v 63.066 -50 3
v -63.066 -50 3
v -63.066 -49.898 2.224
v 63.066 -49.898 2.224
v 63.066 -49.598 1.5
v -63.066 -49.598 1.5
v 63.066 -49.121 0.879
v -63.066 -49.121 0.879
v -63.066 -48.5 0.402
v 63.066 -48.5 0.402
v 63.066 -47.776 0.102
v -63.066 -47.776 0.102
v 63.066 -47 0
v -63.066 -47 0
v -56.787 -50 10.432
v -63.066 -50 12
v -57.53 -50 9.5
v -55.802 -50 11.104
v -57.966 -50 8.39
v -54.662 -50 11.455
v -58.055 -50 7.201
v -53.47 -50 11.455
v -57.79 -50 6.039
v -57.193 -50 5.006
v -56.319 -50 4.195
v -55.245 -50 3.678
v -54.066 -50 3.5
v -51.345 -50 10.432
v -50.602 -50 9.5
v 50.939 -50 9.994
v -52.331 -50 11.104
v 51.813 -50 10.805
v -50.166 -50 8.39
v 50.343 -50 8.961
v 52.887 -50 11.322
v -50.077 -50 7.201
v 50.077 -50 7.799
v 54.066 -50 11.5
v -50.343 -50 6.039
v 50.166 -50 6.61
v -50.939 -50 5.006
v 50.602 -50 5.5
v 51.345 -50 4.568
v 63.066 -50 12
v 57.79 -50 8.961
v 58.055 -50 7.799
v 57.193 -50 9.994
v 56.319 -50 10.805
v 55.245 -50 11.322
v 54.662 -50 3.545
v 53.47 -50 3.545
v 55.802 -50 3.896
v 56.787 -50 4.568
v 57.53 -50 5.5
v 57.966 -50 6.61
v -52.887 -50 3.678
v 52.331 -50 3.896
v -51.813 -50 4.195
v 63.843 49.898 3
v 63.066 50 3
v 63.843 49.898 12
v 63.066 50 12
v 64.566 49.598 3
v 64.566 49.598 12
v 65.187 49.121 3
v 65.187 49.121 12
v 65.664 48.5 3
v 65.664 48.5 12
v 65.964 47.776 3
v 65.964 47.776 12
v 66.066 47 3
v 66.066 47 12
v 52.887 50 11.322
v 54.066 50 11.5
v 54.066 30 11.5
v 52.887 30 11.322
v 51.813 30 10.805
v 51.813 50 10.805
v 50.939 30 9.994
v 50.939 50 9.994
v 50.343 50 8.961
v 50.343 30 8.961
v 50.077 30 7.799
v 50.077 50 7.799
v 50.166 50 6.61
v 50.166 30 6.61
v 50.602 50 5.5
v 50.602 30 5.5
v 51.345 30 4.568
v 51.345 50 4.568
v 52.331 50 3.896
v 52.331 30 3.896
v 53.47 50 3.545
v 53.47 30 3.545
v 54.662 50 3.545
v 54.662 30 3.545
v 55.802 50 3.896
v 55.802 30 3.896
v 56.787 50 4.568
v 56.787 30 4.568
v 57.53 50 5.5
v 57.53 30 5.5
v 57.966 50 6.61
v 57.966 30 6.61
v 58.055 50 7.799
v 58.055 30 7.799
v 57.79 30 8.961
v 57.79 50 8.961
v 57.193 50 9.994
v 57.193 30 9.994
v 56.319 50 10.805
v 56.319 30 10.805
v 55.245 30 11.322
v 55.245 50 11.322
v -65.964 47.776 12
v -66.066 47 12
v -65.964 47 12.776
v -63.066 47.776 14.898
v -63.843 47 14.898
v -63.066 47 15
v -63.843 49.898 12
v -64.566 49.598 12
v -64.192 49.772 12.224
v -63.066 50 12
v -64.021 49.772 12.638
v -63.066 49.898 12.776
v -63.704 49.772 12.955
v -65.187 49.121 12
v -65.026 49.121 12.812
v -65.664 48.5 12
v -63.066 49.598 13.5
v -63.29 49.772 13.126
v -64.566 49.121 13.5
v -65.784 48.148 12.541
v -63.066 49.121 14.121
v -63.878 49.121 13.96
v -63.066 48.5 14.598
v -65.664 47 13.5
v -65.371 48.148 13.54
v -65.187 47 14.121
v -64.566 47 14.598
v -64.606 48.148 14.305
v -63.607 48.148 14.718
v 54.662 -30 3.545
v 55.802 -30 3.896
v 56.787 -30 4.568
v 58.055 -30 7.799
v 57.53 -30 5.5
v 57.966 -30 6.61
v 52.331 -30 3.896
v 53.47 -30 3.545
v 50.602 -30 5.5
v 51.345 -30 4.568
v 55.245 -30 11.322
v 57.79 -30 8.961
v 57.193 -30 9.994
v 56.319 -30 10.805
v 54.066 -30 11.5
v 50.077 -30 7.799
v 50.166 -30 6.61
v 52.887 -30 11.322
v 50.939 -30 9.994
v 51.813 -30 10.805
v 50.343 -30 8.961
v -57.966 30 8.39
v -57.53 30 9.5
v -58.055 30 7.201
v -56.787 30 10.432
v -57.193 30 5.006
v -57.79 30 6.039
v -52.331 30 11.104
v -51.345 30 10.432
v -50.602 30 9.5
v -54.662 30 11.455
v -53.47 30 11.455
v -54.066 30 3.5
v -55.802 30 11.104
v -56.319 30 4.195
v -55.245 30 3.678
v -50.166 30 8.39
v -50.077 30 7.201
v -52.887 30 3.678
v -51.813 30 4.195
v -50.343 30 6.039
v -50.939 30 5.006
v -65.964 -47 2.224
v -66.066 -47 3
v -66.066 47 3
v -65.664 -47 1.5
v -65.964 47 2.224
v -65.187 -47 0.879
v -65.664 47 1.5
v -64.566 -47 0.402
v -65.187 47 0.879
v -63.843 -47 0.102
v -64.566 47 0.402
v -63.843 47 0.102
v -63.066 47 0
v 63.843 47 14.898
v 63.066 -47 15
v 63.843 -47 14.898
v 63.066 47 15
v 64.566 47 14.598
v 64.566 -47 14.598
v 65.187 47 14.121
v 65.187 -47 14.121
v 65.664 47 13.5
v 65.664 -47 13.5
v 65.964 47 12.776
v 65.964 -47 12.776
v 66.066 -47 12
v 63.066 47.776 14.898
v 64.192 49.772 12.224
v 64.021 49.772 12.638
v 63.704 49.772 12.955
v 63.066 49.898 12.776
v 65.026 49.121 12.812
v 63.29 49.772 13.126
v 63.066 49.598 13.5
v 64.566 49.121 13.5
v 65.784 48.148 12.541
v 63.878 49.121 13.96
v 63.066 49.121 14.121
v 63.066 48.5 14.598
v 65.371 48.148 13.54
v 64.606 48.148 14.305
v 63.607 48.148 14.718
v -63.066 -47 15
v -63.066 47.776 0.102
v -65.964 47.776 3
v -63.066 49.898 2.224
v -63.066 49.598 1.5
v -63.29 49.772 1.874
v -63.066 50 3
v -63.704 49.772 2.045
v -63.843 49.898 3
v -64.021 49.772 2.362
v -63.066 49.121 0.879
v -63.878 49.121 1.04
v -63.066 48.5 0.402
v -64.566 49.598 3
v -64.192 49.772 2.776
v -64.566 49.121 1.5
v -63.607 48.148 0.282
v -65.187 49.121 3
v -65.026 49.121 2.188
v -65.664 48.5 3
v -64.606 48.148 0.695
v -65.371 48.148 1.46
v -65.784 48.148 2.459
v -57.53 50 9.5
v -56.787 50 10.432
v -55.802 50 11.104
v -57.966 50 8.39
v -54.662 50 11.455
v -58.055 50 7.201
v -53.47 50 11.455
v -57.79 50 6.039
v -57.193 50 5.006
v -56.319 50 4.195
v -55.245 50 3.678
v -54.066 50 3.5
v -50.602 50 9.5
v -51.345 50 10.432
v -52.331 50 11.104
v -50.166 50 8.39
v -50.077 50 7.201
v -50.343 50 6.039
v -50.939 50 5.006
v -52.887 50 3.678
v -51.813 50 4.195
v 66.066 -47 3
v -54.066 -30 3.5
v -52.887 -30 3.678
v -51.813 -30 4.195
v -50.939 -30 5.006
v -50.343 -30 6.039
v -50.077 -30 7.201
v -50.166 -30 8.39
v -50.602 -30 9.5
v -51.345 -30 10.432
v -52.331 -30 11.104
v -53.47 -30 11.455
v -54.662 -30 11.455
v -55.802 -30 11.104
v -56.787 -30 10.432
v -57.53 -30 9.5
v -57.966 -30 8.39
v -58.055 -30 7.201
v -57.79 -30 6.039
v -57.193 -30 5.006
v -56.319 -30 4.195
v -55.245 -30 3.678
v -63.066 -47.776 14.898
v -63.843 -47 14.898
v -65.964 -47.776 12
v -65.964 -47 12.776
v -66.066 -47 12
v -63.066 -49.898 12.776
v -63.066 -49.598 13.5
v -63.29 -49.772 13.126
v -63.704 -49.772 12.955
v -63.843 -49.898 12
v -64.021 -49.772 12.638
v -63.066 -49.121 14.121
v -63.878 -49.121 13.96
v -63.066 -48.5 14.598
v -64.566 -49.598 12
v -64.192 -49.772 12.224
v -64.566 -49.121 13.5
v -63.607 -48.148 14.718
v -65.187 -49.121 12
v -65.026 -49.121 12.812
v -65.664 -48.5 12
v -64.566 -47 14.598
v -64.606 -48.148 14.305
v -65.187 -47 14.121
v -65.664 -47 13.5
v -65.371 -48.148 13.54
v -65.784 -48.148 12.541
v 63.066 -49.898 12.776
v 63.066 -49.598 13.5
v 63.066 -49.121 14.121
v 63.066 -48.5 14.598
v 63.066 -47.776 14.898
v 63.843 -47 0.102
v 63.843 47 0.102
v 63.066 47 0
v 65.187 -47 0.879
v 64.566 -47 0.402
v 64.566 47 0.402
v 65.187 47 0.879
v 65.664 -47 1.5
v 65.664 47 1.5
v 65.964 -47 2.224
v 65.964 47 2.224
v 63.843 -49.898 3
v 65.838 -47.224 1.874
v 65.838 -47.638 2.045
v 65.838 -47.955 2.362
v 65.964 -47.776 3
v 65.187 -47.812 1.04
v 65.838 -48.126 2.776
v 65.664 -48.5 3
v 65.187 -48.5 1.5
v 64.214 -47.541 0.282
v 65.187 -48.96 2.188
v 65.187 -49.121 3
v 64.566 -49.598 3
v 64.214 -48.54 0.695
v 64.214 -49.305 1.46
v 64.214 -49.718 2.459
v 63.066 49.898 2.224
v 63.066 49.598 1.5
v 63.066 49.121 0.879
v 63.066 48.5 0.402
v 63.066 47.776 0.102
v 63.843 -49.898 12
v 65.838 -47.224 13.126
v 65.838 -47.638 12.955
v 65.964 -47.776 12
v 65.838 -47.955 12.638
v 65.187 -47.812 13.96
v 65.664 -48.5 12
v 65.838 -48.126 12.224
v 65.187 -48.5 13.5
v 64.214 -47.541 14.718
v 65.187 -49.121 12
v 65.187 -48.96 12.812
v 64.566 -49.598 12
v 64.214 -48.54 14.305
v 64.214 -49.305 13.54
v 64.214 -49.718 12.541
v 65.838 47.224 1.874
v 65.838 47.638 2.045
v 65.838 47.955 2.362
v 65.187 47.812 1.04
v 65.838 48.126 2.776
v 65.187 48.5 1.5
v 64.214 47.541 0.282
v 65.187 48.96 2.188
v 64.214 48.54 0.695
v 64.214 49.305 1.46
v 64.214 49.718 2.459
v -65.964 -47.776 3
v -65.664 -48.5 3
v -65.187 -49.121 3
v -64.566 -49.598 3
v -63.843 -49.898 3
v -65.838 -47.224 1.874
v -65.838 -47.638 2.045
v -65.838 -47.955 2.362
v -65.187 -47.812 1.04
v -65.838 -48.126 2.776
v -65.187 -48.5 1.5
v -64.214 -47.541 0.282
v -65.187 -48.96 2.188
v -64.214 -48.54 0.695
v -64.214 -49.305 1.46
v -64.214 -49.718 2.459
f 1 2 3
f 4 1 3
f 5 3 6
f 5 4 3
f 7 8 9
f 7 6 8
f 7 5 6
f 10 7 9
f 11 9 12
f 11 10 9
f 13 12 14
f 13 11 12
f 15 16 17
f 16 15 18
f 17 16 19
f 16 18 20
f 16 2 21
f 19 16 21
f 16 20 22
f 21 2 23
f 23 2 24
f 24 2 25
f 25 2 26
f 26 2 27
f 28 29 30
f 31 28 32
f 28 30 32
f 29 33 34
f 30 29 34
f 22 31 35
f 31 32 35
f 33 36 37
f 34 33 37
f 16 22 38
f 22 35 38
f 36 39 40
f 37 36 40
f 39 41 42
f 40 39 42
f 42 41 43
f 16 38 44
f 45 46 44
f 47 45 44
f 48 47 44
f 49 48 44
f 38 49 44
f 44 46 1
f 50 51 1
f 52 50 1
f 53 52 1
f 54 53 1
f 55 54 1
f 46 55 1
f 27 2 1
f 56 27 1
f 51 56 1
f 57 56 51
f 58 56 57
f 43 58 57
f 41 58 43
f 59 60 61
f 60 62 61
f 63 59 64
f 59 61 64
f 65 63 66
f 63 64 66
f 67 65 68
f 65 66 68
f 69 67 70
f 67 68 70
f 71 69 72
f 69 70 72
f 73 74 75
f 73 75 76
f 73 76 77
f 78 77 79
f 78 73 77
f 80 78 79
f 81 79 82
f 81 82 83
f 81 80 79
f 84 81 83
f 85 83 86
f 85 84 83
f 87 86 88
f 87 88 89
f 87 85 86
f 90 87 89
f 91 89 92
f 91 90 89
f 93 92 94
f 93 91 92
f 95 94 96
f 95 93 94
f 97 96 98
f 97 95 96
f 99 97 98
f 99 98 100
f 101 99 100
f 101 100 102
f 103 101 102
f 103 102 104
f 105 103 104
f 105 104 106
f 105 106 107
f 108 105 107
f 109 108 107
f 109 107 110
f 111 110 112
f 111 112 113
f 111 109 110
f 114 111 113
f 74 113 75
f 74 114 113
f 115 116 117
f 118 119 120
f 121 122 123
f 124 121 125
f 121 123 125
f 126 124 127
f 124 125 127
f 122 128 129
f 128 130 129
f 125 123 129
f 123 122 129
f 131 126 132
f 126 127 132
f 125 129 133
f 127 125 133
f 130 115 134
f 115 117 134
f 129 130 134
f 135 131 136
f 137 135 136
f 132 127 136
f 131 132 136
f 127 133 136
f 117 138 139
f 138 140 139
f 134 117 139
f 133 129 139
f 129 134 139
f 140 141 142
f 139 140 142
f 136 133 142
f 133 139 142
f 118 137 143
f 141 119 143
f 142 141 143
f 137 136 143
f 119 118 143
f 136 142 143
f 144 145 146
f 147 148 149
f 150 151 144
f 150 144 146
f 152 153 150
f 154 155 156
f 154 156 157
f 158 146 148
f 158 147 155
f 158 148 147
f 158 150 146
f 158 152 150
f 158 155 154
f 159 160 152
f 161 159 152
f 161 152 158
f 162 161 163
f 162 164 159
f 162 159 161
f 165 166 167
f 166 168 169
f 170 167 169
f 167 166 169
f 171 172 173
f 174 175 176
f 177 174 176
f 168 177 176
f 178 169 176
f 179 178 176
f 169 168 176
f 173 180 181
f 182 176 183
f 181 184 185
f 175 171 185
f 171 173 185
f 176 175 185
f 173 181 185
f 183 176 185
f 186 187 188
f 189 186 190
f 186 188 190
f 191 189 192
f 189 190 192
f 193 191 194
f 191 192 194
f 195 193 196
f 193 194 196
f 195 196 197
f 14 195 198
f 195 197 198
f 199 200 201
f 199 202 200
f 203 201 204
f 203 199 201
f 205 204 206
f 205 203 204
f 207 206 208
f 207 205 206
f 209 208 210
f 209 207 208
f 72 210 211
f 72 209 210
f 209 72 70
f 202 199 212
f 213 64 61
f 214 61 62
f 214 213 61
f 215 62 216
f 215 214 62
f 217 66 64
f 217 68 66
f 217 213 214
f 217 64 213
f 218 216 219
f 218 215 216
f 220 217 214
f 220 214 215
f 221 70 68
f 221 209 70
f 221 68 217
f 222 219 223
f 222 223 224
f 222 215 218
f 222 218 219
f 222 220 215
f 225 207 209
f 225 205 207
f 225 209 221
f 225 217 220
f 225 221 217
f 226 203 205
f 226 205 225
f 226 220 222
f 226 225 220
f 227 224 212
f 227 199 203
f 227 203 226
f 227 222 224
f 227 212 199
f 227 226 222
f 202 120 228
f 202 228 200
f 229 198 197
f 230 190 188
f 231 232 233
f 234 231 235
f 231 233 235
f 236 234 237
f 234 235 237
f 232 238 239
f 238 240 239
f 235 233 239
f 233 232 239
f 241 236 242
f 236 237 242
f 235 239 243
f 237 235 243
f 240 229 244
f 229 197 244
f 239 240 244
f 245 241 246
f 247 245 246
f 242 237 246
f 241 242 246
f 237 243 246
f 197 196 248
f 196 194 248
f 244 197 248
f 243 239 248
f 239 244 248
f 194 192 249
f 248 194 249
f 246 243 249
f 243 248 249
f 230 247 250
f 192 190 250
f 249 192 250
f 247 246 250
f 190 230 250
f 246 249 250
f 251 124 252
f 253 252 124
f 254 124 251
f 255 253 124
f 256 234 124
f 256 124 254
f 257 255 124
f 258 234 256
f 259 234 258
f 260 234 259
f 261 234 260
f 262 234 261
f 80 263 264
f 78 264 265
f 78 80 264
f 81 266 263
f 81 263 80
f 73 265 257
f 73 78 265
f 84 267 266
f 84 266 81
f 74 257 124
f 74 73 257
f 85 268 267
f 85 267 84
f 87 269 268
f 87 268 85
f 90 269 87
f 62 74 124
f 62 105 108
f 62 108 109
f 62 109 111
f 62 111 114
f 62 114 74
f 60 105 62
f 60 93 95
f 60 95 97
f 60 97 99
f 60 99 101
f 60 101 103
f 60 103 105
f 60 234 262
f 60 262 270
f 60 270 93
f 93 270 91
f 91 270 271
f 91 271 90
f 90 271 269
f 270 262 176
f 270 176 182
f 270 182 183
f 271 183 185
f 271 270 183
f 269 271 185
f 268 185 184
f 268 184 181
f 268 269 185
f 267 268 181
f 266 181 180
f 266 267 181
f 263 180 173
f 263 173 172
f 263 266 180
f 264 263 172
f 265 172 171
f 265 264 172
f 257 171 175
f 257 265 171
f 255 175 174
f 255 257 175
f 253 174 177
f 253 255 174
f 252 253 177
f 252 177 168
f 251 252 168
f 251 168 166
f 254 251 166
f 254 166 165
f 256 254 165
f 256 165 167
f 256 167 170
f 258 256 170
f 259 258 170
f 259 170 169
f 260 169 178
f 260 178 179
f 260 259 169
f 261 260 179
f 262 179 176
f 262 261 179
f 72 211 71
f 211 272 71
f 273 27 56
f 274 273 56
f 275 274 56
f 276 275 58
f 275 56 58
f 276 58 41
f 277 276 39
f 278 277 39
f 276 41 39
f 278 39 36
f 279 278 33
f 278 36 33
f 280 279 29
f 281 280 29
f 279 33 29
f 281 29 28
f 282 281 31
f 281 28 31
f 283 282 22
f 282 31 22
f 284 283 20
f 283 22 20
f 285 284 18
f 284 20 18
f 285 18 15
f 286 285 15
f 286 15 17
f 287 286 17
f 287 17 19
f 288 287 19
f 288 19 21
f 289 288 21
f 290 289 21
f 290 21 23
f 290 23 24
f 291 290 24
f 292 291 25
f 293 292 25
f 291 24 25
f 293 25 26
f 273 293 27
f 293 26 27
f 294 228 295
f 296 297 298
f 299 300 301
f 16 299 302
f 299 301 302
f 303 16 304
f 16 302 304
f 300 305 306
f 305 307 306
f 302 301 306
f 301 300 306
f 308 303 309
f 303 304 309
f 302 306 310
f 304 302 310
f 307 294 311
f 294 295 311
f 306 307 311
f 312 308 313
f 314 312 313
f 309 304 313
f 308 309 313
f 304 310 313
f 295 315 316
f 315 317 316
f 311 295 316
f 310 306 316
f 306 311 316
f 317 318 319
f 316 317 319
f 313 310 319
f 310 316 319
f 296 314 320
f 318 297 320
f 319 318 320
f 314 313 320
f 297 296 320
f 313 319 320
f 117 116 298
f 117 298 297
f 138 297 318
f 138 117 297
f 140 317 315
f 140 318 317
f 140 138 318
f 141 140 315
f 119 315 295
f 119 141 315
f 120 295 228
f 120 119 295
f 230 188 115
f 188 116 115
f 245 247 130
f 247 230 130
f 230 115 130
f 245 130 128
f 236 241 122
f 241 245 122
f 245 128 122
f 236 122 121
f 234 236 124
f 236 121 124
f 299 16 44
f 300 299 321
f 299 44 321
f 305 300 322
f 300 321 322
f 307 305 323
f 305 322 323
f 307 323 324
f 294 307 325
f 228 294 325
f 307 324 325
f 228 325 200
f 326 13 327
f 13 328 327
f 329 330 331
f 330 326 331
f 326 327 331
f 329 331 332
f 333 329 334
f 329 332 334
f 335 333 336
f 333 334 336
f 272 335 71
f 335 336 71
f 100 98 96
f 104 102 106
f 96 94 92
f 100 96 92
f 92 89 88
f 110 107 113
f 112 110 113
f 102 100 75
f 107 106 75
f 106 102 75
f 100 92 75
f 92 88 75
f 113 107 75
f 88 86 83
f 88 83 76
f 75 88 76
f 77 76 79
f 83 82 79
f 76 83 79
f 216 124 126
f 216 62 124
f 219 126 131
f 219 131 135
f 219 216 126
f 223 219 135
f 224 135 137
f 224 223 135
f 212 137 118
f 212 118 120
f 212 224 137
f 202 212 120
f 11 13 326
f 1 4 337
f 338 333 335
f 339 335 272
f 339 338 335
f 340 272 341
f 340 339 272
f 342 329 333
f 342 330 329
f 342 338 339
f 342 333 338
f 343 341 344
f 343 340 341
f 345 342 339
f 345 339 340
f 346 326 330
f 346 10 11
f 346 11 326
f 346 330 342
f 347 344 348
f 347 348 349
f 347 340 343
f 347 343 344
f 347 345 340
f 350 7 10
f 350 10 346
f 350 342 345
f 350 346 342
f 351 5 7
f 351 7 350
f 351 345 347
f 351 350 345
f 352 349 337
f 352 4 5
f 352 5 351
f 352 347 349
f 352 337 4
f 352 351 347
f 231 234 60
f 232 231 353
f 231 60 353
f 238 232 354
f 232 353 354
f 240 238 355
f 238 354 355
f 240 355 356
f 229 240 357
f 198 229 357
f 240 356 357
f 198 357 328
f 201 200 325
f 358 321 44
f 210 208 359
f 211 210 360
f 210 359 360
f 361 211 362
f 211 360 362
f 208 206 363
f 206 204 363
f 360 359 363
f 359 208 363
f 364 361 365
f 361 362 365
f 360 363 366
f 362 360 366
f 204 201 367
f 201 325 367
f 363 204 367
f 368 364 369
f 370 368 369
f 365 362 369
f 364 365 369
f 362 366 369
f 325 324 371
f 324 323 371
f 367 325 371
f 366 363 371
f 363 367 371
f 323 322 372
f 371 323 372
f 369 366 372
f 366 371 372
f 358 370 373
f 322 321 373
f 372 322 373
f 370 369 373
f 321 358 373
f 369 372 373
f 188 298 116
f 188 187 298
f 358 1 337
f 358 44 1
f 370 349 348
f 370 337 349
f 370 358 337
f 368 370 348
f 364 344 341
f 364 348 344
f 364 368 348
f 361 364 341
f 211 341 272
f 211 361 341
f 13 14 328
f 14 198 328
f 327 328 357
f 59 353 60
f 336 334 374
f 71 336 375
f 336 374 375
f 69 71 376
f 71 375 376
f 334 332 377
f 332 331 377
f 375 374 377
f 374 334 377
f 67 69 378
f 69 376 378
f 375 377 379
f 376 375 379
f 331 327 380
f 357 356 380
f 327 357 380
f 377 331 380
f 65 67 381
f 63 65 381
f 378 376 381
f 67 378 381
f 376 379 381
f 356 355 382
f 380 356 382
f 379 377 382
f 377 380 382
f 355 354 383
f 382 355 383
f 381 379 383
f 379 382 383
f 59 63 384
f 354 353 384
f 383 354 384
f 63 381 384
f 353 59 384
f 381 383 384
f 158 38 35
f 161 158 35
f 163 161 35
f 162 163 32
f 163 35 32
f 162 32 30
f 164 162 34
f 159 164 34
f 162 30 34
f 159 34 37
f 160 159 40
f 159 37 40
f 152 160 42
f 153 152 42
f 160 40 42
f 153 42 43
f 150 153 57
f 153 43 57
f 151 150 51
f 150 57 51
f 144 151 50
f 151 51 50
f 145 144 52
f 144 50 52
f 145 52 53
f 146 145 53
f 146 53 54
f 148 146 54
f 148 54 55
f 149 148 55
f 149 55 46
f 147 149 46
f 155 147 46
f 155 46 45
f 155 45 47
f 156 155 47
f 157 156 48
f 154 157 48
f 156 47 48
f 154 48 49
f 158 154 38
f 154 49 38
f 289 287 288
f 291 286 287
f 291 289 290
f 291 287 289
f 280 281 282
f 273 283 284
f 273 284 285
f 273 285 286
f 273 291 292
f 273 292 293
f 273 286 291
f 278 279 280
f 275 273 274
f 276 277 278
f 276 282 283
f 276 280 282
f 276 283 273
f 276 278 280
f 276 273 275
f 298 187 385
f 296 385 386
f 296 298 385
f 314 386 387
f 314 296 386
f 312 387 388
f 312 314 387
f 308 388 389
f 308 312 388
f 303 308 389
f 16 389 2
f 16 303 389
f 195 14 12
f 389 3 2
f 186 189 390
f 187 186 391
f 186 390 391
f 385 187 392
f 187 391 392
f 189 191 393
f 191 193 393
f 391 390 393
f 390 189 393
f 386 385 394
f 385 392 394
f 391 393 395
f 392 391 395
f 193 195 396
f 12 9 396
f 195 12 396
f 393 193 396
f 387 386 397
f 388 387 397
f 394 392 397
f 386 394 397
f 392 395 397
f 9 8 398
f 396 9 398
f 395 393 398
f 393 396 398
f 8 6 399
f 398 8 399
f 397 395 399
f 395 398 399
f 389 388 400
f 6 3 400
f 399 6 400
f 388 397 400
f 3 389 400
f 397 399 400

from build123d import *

# Parameters (mm, degrees)
SKETCH1_W           = 132.132132132
SKETCH1_H           = 100
BOSS_EXTRUDE1_DEPTH = 15
SKETCH2_R           = 4
CUT_EXTRUDE1_DEPTH  = 20
FILLET1_R           = 3


with BuildPart() as part:
    # Sketch1 → Boss-Extrude1 (new body)
    with BuildSketch(Plane.XY):
        Rectangle(SKETCH1_W, SKETCH1_H)
    extrude(amount=BOSS_EXTRUDE1_DEPTH)

    # Sketch2 → Cut-Extrude1 (cut)
    with BuildSketch(Plane.XZ.offset(50)):
        with Locations(Location((-54.066066066, 7.5, 0), (0, 0, 270))):
            Circle(SKETCH2_R)
        with Locations(Location((54.066066066, 7.5, 0), (0, 0, 90))):
            Circle(SKETCH2_R)
    cut_extrude1 = extrude(amount=-CUT_EXTRUDE1_DEPTH, mode=Mode.SUBTRACT)

    # Mirror1: Cut-Extrude1 across plane
    add(cut_extrude1.mirror(Plane.ZX), mode=Mode.SUBTRACT)

    # Fillet1
    fillet1_edges = [part.edges().sort_by_distance(p)[0] for p in [
        (-66.066066066, 0, 15),
        (0, -50, 15),
        (66.066066066, 0, 15),
        (0, -50, 0),
        (-66.066066066, 0, 0),
        (0, 50, 0),
        (66.066066066, 0, 0),
        (66.066066066, -50, 7.5),
        (-66.066066066, -50, 7.5),
        (-66.066066066, 50, 7.5),
        (66.066066066, 50, 7.5),
        (0, 50, 15),
    ]]
    fillet(fillet1_edges, radius=FILLET1_R)


solid = part.part
